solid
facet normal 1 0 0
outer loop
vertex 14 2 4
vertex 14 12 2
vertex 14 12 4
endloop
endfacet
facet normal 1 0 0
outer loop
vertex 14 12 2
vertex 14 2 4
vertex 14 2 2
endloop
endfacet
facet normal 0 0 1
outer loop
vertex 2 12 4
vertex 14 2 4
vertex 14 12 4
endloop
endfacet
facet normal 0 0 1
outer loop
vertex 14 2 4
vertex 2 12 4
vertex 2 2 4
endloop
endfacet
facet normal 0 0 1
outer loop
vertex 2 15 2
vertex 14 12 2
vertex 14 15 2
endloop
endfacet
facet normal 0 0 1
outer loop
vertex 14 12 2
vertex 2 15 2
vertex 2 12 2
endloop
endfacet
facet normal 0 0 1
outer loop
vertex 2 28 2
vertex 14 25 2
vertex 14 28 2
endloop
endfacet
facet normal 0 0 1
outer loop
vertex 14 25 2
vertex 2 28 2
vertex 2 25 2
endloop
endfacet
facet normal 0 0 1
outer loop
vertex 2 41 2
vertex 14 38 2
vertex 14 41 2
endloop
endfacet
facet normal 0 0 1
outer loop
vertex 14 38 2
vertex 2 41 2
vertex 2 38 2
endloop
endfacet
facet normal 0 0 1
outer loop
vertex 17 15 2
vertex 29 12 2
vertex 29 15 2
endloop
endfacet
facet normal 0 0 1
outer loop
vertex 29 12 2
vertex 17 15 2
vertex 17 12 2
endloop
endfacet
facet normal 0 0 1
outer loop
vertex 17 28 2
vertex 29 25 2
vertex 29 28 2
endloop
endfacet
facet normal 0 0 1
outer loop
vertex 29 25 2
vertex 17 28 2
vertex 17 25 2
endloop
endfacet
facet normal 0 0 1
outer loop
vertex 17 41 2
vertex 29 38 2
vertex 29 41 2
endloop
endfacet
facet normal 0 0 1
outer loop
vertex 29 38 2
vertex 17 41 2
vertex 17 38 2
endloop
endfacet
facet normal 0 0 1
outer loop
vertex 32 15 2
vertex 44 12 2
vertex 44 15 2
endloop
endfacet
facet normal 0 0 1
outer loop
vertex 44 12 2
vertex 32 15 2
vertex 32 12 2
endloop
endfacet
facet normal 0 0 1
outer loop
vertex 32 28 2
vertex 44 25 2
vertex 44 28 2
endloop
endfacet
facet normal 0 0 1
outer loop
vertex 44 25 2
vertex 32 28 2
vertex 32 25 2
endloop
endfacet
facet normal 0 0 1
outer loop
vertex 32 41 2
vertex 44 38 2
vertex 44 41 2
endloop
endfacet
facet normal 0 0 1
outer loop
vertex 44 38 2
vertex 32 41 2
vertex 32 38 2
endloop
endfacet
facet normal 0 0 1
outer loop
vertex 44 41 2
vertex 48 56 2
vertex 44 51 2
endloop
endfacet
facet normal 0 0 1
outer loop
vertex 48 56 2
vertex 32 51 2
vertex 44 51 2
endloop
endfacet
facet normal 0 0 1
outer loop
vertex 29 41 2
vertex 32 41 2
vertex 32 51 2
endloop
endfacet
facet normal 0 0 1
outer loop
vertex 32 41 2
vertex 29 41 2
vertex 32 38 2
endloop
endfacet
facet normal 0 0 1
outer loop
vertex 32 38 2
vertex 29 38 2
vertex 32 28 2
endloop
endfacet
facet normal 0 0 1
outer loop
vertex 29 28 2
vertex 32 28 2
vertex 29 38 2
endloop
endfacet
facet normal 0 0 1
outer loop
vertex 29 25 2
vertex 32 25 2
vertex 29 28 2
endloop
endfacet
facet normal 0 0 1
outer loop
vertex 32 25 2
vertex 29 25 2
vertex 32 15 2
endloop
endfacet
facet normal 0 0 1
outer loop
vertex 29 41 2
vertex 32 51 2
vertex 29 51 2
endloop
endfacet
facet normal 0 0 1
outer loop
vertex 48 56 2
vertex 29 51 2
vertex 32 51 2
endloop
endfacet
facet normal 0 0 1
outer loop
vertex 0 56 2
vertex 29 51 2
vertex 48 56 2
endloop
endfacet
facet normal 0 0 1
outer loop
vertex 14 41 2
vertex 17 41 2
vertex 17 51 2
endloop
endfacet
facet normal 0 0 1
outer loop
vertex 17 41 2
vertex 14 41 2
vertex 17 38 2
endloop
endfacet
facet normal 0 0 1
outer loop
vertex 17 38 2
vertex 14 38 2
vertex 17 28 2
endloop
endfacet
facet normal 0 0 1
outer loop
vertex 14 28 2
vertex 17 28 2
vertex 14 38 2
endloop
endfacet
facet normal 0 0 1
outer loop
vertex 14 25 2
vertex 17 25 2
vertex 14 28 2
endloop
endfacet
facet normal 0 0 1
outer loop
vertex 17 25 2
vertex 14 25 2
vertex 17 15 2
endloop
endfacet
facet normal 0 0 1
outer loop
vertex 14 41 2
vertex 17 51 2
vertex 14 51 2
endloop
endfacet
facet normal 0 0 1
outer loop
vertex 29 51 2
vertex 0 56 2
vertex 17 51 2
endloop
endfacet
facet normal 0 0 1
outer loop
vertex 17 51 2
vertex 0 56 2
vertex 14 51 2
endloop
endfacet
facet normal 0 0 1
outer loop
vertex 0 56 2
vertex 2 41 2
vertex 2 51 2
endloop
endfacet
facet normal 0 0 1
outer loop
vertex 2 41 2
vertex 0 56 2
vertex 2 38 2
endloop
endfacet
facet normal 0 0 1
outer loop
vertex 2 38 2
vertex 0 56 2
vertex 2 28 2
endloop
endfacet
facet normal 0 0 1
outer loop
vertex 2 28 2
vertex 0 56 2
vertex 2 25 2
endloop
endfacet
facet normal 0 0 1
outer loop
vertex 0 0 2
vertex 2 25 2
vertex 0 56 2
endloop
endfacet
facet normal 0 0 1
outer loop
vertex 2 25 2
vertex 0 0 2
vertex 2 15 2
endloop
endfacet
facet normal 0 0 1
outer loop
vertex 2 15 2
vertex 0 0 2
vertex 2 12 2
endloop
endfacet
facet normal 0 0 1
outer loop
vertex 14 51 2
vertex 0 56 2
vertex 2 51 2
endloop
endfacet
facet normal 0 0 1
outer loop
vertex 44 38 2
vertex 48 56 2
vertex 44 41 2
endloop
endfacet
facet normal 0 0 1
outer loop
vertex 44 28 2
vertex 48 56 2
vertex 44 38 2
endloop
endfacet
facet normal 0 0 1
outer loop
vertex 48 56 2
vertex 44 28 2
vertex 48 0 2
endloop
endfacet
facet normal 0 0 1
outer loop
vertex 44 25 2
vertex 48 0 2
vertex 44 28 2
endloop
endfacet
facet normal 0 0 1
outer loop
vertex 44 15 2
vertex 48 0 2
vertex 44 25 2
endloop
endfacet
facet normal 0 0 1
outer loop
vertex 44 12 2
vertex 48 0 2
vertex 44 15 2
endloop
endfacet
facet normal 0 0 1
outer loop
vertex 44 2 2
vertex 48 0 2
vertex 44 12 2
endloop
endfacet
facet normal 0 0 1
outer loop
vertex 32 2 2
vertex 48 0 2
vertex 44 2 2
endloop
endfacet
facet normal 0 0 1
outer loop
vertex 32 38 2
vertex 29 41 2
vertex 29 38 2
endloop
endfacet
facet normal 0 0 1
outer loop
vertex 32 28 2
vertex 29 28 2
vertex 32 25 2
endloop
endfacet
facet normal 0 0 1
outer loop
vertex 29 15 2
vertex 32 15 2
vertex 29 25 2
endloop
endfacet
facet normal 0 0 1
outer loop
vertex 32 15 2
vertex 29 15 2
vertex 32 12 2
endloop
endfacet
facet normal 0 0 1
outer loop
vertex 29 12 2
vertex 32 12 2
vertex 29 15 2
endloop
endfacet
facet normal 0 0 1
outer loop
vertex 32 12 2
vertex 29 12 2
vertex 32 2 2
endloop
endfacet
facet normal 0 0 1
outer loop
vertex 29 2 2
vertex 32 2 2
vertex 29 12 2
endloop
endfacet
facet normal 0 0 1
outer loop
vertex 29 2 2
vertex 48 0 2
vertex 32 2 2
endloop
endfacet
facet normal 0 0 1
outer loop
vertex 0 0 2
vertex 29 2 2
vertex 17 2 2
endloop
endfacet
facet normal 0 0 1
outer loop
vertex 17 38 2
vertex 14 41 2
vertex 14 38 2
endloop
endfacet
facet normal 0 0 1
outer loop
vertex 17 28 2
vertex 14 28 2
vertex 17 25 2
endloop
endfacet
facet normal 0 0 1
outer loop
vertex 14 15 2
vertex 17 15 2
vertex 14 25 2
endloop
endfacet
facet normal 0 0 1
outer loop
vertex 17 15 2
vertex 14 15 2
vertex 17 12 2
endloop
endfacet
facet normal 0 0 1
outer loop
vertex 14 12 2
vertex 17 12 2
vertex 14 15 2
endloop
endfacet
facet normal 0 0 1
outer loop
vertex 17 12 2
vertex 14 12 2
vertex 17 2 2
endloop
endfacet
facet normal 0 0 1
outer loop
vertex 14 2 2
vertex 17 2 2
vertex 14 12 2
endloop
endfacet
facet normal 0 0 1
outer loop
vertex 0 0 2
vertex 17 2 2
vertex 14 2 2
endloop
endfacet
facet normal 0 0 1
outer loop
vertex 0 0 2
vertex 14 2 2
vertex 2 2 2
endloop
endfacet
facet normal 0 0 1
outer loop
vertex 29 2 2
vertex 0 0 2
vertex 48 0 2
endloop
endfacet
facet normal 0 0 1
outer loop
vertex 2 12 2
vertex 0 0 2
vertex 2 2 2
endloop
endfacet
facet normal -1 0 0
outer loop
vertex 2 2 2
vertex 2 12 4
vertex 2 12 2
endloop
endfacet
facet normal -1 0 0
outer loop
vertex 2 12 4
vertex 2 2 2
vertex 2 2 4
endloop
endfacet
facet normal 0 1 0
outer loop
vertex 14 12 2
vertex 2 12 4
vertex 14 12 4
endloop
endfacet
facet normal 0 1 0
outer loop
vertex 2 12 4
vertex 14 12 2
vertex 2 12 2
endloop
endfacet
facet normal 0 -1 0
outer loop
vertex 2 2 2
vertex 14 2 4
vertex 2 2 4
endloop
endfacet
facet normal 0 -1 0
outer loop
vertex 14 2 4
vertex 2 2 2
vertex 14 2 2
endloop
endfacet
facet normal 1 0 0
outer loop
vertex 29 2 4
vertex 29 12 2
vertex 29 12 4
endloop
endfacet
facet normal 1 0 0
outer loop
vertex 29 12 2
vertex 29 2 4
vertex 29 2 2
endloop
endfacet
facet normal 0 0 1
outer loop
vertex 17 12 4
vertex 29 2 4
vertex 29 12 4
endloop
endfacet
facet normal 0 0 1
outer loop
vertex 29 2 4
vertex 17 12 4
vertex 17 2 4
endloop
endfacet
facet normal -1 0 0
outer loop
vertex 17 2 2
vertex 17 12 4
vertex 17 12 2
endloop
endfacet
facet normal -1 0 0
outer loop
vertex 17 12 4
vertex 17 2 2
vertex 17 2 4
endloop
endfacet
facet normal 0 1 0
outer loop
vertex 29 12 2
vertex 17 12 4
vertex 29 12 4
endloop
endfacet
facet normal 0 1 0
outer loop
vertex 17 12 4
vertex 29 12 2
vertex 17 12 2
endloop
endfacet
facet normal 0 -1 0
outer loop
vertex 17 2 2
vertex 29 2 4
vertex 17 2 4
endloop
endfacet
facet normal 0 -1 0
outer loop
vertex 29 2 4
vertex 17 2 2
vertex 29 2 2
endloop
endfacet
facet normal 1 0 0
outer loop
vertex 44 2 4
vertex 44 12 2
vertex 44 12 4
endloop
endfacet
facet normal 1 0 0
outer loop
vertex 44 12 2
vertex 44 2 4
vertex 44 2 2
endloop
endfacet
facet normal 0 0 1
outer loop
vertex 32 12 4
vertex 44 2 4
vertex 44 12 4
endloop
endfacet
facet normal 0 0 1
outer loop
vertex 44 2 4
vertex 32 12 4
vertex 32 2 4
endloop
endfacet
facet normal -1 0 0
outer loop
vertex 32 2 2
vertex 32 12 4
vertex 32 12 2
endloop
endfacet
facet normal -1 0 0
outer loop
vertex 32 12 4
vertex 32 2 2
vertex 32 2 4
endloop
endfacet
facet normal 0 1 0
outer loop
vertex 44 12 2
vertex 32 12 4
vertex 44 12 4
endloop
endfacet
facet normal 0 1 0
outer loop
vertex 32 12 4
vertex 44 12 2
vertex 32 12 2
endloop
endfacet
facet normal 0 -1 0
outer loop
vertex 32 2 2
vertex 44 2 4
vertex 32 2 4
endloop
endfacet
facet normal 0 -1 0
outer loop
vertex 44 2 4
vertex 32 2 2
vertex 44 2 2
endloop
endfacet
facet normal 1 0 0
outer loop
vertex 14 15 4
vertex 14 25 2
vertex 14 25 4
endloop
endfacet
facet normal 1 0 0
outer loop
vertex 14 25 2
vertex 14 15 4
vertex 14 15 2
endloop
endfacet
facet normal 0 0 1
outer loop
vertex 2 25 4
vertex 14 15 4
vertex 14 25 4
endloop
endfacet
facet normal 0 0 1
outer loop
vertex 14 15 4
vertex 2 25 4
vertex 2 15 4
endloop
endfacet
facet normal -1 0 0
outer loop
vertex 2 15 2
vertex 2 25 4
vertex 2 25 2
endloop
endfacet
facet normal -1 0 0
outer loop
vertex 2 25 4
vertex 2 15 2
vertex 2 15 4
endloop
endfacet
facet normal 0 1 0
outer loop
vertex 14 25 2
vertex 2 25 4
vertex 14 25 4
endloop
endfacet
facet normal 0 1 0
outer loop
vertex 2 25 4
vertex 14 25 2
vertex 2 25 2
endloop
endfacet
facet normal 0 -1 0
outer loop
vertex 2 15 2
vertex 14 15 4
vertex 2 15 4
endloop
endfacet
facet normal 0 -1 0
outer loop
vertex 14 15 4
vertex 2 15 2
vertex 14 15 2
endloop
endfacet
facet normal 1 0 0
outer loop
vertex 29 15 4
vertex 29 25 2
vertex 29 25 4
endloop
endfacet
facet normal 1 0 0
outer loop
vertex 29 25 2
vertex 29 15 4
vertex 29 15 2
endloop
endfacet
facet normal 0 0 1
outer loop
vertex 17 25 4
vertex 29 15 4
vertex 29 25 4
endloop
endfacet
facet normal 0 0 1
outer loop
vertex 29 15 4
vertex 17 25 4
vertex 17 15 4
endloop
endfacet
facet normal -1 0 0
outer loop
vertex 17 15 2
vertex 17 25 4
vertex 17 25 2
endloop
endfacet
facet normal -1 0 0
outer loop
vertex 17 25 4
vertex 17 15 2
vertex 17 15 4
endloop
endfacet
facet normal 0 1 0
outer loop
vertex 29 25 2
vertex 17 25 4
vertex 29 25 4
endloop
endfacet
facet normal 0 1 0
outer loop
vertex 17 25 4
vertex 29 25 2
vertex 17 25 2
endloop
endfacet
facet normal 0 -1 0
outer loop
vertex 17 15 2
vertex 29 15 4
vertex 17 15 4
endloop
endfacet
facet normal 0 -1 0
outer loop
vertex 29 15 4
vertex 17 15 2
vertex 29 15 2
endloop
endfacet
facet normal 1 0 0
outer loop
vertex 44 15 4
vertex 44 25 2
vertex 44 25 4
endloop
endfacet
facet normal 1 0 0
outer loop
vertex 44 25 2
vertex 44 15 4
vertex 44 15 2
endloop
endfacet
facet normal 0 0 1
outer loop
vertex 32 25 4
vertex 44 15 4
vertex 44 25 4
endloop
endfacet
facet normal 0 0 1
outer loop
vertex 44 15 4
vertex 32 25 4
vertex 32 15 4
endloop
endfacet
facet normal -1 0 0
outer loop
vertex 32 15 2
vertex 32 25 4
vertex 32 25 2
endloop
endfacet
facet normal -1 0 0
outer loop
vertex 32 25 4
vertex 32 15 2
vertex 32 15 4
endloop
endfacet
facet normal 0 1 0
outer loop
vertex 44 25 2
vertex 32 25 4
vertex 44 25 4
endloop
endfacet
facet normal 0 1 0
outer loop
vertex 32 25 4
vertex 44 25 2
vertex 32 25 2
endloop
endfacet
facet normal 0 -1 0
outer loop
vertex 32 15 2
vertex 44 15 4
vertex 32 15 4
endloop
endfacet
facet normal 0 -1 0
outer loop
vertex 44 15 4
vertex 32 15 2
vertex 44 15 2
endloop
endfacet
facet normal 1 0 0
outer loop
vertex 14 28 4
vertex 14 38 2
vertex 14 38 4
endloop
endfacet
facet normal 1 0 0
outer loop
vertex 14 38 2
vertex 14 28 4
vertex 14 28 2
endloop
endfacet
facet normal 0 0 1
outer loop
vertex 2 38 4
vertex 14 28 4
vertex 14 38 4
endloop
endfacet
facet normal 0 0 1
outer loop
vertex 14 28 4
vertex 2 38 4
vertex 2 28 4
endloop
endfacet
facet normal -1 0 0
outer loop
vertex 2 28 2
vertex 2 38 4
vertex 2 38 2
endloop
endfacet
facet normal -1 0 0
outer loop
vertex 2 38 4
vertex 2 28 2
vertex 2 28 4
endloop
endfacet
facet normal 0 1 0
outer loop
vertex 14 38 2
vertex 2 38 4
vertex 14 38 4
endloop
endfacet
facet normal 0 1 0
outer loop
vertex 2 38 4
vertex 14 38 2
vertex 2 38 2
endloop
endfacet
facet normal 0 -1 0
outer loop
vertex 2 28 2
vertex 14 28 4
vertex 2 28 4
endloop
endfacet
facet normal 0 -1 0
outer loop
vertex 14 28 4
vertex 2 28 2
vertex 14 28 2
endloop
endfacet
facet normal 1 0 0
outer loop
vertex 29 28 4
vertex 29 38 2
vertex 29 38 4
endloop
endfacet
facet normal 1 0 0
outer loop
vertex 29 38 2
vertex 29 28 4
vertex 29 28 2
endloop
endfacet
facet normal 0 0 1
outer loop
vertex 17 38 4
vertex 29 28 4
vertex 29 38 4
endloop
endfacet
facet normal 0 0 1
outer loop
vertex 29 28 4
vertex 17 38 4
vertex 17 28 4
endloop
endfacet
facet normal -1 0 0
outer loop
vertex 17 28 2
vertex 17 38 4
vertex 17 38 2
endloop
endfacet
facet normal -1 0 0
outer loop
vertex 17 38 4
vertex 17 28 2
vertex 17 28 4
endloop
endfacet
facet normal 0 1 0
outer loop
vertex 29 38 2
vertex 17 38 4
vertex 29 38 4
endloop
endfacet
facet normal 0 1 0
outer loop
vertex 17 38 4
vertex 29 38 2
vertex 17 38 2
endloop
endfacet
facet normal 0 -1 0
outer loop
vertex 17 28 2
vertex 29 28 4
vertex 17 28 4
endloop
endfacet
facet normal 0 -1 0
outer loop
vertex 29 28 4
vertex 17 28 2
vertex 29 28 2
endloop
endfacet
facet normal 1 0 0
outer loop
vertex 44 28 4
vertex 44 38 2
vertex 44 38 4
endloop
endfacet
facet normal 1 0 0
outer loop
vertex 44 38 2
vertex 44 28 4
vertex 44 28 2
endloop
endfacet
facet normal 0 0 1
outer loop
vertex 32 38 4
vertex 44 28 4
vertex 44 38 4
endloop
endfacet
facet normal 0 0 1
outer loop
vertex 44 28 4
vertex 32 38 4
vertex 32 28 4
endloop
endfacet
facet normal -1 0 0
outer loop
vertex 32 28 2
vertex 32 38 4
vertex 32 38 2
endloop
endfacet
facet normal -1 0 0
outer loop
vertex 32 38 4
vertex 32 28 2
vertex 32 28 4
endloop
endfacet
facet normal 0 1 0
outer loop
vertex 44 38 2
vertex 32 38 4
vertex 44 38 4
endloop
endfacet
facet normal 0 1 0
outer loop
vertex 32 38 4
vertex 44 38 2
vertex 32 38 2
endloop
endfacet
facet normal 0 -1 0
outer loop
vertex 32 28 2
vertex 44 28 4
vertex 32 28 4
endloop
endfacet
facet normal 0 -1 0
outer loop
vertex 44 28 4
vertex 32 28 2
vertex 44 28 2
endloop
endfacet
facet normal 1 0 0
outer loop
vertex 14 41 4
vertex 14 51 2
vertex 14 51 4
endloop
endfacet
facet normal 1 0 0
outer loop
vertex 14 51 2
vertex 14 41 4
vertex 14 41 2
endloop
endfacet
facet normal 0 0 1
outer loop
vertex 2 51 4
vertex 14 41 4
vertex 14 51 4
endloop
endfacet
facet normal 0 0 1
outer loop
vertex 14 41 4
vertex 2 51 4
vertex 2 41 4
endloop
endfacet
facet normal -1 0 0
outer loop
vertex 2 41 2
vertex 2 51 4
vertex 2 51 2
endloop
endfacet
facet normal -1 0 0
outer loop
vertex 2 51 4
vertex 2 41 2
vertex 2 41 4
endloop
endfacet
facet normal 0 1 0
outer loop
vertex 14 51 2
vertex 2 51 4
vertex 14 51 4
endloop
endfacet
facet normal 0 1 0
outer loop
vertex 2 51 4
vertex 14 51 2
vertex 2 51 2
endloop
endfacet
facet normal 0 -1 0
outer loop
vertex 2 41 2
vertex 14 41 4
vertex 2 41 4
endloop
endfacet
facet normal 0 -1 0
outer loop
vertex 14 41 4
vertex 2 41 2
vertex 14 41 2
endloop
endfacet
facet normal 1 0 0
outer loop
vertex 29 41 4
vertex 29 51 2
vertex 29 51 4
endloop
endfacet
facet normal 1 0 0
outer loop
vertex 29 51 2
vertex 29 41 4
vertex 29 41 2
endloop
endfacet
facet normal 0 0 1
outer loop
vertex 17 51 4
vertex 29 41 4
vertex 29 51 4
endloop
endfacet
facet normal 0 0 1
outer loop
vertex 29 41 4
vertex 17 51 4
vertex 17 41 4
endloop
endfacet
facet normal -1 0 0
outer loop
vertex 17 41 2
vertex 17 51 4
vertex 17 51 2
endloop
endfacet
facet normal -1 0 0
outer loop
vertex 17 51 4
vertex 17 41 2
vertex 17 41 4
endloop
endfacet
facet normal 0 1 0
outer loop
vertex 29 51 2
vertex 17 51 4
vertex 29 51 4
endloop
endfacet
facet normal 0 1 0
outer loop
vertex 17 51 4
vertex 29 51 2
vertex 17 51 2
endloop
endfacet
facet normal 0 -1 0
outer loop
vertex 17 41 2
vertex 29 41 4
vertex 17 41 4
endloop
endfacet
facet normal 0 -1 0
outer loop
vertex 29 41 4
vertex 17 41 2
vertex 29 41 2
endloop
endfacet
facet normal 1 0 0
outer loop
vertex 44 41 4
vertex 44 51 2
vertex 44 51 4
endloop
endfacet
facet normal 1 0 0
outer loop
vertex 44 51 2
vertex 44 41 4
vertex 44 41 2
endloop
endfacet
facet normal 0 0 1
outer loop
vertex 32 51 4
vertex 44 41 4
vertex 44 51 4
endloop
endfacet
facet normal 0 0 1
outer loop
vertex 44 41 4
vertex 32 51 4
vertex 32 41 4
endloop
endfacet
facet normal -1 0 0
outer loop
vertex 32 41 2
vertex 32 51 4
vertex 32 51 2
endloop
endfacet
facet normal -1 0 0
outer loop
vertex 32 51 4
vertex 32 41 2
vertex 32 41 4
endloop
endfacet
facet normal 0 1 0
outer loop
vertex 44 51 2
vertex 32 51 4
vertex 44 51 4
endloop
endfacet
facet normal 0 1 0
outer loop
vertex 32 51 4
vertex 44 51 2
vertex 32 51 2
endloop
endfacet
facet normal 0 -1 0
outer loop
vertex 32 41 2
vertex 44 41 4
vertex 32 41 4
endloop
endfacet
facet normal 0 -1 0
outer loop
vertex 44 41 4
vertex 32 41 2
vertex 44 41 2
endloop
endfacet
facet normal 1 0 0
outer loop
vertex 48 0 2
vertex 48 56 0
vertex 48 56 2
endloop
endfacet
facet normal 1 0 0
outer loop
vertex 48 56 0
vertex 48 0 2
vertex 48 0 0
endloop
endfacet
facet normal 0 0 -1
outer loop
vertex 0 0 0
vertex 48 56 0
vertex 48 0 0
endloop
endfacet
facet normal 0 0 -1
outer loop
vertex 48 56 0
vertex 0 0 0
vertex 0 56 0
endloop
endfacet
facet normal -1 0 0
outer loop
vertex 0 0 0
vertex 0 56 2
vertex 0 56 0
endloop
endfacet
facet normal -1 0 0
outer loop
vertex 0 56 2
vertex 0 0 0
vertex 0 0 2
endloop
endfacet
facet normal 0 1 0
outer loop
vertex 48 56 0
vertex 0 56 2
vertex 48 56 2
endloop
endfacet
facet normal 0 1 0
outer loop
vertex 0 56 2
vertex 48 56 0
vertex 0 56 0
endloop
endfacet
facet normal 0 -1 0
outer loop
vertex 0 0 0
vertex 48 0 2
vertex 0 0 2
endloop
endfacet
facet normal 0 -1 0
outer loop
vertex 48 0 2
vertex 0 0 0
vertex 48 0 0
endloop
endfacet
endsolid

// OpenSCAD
// Concept only. Provisional dimensions in mm.
$fn=32;
cube([48,56,2]);for(r=[0:3])for(c=[0:2])translate([2+c*15,2+r*13,2])cube([12,10,2]);
